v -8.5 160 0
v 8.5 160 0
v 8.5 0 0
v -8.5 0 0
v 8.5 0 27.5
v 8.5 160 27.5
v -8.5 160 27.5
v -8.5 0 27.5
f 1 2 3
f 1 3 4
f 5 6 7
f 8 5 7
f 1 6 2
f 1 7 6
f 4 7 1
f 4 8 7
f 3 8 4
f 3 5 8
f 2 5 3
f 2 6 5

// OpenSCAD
// Utility knife, 17 mm blade
// Geometry follows the holder clearance profile. Its dimensions describe the pocket used in the source design. Physical tool dimensions and fit have yet to be measured.
// Units: mm
$fn = 64;
union() {
    translate([0, 0.0, 0]) rotate([0, 0, 0])
        linear_extrude(height=27.5) polygon(points=[[-8.5, 0], [-8.5, 160], [8.5, 160], [8.5, 0]]);
}
